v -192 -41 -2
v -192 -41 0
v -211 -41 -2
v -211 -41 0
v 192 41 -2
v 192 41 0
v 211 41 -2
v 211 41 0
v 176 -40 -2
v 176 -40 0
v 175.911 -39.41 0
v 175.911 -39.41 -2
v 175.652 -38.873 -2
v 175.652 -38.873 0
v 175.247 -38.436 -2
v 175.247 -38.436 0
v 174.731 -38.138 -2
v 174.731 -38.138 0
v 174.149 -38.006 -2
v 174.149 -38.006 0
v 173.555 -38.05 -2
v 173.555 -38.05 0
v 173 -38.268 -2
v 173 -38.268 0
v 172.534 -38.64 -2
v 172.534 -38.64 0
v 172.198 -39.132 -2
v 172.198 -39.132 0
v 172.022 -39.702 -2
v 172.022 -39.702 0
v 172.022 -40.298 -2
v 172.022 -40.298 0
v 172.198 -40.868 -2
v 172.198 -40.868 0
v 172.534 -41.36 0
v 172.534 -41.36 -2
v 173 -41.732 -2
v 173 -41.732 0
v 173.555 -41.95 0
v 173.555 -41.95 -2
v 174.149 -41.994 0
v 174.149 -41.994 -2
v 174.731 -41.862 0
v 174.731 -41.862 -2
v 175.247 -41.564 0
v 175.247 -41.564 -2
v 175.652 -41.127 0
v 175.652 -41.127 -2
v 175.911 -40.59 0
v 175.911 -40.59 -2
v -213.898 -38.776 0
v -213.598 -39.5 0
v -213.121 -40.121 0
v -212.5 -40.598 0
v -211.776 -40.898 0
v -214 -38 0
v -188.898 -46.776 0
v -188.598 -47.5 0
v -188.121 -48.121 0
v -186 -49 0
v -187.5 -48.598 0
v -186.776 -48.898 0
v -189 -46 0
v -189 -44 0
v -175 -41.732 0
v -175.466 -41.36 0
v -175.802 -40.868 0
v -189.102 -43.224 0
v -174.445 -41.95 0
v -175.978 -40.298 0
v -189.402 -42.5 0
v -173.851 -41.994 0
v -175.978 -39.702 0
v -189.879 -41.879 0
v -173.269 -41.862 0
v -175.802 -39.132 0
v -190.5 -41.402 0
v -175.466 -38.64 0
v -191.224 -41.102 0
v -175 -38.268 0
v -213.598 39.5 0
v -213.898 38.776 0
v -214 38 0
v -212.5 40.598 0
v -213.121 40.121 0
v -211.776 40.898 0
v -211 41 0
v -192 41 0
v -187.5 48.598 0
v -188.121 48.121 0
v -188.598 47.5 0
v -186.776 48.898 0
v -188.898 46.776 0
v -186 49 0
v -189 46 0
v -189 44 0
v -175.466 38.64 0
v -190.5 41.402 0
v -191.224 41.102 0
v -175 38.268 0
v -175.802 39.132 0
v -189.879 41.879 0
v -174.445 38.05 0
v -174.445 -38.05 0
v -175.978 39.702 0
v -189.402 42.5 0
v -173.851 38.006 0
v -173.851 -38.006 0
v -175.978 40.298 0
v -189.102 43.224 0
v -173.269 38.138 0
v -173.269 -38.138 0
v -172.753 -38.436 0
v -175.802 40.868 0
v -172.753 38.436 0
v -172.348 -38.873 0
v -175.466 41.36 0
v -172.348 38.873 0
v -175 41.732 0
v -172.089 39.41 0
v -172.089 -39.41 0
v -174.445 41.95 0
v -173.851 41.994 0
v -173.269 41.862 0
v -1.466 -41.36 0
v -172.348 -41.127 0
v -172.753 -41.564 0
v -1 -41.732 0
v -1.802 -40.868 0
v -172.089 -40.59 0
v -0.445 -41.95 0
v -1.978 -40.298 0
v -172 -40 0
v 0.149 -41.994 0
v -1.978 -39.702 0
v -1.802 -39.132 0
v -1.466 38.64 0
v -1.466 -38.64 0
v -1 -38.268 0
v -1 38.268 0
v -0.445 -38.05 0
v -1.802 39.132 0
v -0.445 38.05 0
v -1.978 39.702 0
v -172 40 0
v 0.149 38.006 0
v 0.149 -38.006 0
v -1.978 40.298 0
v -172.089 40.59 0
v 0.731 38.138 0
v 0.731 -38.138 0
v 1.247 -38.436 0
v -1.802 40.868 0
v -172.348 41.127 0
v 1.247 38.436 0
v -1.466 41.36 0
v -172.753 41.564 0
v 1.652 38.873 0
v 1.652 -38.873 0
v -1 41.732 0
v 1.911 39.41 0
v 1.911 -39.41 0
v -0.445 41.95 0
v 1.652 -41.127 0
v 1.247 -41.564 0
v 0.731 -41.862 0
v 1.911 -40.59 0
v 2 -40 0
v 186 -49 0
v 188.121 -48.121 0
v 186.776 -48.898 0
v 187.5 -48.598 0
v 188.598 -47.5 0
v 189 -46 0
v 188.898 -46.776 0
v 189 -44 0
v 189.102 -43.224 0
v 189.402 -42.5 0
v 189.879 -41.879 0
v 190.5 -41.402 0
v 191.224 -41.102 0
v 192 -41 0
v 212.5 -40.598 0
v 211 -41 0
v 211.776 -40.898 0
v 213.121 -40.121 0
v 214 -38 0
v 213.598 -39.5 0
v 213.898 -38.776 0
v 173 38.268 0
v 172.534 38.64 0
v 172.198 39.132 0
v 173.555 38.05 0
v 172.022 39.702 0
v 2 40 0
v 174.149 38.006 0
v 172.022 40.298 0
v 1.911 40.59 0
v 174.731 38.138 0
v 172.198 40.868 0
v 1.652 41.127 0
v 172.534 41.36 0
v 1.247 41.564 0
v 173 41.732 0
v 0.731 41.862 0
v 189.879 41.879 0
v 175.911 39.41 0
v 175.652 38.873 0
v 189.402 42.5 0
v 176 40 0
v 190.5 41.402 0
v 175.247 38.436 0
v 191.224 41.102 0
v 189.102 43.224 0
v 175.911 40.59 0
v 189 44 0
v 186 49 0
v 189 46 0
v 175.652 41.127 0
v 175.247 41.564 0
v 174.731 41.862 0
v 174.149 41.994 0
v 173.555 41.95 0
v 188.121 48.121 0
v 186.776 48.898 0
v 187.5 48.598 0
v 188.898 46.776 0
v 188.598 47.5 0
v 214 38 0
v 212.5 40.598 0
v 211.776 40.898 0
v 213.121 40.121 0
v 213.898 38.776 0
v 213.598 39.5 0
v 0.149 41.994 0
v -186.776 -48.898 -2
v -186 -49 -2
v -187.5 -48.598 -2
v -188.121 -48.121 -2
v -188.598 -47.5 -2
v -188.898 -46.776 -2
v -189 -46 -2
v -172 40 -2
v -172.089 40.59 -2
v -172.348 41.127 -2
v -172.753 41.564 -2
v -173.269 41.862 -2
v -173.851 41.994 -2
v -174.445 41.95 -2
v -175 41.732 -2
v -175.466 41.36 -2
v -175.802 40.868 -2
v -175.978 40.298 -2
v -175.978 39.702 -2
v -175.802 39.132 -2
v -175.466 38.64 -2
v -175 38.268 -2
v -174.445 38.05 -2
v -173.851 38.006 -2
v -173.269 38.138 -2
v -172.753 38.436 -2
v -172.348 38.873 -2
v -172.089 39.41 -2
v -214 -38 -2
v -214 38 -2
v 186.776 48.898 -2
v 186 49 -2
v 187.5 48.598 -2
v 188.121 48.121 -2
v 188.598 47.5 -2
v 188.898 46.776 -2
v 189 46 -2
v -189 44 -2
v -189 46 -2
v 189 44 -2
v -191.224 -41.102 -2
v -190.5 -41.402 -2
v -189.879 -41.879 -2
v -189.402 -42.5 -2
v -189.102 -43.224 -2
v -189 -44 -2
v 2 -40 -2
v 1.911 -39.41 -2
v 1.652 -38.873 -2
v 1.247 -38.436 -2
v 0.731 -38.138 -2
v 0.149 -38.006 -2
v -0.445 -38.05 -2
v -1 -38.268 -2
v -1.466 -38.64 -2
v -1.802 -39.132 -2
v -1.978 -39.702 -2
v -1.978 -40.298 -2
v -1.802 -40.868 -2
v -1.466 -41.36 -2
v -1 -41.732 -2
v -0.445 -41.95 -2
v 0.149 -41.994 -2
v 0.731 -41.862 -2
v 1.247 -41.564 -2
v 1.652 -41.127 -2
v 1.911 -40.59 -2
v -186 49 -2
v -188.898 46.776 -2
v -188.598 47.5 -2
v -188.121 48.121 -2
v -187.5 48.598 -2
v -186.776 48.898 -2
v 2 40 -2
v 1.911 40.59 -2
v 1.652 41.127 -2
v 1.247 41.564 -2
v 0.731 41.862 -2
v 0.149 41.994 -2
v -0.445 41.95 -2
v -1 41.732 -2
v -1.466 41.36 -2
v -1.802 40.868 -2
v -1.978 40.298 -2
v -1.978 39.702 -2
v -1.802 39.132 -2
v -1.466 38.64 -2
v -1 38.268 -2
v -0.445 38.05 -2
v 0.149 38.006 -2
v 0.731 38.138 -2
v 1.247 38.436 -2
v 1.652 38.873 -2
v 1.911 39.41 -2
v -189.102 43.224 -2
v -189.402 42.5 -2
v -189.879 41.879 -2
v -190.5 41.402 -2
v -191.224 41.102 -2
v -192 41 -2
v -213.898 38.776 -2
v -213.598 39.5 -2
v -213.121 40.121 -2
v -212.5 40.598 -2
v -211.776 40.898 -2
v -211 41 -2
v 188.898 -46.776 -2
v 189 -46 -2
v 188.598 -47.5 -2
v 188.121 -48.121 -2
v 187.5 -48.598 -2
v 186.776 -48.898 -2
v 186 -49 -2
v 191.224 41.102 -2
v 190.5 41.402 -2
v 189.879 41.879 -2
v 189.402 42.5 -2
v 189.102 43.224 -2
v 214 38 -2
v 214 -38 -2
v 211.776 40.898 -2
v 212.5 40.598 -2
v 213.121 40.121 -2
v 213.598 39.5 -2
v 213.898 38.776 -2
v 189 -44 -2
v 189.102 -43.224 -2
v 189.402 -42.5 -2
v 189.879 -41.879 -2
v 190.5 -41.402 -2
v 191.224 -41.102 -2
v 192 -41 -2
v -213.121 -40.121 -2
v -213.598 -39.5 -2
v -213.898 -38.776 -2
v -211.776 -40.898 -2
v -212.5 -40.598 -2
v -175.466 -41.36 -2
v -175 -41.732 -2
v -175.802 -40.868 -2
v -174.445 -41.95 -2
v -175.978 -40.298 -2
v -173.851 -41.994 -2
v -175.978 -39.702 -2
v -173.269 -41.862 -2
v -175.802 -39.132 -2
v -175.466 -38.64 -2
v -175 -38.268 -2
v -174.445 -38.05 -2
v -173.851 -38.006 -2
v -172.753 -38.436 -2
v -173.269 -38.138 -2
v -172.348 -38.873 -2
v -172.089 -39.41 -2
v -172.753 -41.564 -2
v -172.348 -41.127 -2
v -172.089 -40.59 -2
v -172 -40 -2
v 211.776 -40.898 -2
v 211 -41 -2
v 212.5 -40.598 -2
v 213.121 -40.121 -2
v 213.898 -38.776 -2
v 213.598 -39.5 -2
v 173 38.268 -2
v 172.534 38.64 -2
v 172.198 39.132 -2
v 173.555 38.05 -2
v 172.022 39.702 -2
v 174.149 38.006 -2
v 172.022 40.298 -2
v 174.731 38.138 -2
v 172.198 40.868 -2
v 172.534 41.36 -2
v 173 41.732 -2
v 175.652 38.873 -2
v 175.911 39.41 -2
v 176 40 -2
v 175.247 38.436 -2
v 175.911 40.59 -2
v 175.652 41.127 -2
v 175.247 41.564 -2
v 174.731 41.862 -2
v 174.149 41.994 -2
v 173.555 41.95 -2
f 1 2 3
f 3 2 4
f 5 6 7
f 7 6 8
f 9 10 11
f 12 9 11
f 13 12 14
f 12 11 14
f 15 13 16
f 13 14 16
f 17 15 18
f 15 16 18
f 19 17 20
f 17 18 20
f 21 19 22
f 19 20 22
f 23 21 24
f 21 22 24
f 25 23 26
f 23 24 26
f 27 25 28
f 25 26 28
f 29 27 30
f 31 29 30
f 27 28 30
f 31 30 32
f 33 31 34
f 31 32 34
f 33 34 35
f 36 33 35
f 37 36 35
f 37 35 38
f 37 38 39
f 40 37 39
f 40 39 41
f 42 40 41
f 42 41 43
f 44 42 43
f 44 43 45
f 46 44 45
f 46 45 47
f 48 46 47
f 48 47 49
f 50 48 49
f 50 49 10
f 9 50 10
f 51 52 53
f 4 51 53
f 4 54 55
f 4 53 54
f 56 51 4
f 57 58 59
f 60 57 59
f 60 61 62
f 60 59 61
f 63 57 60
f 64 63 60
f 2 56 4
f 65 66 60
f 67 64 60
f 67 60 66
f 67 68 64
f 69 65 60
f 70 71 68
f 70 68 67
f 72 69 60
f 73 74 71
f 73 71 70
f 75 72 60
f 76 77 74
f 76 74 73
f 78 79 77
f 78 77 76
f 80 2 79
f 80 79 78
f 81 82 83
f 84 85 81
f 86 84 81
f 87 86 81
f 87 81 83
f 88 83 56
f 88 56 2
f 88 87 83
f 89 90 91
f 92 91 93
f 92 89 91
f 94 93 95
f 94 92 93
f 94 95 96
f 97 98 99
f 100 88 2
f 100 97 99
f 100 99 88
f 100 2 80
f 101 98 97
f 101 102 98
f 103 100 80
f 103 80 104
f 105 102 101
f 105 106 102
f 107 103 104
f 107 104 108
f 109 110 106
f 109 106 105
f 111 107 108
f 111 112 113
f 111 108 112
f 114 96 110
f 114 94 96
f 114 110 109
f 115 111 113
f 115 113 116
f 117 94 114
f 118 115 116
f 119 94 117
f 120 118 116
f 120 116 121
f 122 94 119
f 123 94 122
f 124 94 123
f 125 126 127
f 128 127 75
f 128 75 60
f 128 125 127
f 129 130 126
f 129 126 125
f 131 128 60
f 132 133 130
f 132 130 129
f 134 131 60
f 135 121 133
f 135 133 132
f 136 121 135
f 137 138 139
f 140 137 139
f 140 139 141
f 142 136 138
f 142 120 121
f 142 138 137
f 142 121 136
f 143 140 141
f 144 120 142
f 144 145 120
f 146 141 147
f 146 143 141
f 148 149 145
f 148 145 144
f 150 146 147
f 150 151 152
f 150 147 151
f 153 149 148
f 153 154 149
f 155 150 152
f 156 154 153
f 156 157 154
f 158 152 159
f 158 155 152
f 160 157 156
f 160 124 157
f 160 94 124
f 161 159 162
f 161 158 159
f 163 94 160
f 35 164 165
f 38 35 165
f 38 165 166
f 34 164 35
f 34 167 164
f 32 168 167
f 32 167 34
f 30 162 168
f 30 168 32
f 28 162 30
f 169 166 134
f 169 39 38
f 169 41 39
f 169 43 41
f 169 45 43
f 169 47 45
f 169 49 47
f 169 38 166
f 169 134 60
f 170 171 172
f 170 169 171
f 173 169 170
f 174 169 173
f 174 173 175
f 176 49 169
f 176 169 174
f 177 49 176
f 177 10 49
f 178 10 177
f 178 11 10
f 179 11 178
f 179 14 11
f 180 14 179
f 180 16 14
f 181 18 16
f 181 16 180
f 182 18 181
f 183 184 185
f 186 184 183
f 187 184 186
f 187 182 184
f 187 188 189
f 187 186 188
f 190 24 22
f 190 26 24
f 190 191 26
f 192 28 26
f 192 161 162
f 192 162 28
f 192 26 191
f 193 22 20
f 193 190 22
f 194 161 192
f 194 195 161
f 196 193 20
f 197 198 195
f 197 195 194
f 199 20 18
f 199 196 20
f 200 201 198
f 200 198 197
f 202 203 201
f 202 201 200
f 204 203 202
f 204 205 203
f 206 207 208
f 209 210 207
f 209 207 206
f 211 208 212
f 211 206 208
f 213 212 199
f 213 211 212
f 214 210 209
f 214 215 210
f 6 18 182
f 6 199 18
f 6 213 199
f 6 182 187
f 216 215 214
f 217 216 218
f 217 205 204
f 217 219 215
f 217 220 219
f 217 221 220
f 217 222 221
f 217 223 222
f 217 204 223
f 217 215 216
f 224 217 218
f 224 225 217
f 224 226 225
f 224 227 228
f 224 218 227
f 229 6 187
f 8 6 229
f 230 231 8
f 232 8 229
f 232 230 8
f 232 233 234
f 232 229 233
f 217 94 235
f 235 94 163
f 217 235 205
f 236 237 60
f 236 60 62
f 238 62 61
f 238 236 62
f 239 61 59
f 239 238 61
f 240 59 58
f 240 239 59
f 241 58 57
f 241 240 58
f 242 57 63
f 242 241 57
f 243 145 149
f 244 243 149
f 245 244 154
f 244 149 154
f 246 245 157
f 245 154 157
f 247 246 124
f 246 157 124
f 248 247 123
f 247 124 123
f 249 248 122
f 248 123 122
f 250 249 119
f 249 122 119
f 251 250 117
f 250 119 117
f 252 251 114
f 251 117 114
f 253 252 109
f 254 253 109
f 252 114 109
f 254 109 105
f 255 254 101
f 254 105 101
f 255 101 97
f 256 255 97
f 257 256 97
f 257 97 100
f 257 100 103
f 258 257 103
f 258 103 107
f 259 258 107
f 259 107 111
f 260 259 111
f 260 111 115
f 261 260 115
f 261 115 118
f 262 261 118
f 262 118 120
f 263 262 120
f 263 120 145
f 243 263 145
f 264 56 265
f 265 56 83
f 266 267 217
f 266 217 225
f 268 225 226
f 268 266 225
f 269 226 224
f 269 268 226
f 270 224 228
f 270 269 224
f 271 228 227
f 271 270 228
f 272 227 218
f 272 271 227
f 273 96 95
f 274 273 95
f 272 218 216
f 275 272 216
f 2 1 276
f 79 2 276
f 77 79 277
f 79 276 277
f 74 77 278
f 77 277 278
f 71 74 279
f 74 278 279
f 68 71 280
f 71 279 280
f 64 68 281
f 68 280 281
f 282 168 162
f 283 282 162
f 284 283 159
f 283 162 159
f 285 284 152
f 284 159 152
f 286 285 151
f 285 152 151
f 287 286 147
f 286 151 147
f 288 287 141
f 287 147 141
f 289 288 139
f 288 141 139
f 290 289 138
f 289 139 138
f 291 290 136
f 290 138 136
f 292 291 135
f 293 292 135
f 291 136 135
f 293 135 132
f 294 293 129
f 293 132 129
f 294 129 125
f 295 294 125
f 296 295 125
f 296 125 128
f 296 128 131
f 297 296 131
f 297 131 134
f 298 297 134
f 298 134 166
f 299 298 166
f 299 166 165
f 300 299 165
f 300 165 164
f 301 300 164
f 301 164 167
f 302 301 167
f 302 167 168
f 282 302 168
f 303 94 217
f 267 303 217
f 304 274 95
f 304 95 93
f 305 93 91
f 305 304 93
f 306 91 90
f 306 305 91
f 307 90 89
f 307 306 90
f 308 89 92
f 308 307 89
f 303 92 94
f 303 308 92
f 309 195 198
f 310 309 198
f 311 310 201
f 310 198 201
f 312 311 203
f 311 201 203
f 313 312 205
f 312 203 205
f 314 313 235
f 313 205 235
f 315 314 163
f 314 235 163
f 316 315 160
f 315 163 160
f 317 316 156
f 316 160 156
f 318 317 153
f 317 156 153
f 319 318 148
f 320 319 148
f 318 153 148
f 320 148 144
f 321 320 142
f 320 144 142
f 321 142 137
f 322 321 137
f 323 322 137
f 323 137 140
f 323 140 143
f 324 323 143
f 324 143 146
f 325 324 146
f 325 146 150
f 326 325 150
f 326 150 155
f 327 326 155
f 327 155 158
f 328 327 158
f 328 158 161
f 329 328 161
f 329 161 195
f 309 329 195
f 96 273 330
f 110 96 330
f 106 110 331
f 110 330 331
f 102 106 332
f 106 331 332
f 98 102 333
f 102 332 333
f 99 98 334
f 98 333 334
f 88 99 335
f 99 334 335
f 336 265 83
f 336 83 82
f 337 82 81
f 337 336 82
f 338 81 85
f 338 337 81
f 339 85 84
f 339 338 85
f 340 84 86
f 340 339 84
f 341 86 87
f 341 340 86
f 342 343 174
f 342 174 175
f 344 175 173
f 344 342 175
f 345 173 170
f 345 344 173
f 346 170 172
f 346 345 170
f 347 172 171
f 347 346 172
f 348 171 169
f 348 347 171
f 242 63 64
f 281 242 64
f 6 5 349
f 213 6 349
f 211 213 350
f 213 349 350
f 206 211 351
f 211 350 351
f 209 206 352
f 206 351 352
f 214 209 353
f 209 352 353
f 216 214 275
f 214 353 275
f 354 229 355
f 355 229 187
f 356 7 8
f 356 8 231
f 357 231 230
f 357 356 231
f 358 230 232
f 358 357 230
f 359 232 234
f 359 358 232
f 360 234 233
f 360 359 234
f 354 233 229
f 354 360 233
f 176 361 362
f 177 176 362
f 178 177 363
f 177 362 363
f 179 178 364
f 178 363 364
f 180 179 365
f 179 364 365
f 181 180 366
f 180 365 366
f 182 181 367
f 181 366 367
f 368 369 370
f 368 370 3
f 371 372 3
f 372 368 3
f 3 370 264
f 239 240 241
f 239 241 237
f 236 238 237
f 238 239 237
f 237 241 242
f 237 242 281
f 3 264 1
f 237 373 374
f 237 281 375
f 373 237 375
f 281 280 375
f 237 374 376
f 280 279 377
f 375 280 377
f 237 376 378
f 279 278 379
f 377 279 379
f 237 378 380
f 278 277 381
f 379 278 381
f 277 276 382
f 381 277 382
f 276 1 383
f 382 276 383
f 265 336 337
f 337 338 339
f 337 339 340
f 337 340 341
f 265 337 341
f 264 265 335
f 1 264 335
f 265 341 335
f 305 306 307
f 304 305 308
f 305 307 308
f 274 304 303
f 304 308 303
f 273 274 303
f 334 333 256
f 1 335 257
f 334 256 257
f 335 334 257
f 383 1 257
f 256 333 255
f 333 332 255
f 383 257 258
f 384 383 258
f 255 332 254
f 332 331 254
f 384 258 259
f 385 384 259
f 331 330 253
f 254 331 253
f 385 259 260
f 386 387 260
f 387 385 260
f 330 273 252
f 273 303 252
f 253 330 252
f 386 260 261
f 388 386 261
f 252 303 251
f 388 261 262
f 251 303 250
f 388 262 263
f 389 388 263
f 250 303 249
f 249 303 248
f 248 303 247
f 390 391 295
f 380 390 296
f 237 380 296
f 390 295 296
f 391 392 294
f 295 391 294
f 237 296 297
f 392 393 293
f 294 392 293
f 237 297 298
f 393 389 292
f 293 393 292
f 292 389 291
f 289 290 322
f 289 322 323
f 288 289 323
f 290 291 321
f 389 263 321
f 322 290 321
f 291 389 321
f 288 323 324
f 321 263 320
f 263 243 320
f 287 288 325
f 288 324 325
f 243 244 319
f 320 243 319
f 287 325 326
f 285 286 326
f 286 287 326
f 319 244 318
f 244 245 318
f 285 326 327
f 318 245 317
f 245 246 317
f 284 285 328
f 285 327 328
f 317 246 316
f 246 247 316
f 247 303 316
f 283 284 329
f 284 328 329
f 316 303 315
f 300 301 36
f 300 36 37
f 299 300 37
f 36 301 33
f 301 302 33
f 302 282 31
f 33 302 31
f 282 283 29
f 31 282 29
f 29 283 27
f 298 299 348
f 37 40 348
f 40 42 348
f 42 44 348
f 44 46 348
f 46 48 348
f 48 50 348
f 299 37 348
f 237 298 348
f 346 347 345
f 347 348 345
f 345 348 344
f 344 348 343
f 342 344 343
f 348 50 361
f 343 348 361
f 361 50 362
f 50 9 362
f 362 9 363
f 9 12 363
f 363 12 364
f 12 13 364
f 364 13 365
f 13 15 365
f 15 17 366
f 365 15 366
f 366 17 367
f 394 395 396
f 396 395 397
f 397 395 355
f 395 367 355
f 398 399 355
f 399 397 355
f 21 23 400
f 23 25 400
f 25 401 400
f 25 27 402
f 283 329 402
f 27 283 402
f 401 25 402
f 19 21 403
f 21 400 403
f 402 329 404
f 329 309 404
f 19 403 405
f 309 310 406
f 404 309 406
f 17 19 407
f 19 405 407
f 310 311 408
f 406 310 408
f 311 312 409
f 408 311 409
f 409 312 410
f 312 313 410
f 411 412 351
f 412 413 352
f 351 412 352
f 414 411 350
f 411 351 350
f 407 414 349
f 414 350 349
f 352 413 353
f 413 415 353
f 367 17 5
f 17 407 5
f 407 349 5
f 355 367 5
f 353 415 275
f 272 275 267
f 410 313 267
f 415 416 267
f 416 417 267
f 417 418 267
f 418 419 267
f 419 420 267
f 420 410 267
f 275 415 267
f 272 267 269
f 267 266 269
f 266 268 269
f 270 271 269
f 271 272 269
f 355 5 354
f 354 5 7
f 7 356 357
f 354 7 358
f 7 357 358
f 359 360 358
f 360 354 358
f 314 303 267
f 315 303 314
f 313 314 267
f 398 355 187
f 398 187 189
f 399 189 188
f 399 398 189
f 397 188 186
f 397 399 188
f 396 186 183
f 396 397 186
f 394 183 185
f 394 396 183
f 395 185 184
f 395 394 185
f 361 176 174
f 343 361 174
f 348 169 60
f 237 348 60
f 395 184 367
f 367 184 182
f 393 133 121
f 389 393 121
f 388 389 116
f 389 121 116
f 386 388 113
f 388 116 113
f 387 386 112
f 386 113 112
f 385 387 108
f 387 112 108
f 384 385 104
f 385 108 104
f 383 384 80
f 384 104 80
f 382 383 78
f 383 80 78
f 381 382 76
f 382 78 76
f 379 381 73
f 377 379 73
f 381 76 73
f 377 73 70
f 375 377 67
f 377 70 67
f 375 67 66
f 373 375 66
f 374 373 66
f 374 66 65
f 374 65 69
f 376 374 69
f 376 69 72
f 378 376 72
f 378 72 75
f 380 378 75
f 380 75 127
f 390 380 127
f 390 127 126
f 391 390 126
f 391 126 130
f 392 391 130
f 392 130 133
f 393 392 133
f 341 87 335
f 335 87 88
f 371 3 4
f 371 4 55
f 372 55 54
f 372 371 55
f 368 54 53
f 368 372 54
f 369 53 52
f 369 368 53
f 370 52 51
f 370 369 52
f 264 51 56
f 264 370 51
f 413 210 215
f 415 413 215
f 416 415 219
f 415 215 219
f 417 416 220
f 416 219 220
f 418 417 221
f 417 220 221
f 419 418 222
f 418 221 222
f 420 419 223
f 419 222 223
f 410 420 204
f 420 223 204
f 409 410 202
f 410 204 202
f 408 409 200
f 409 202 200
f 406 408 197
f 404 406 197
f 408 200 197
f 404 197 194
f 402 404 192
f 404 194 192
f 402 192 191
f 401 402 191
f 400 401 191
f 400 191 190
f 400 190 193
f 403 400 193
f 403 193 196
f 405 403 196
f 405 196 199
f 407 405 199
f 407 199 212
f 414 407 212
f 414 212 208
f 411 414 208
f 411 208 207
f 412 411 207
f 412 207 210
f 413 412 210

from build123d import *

# Parameters (mm, degrees)
BASE_FLANGE1_DEPTH    = 2
BREAK_CORNER1_START   = -2
BREAK_CORNER1_DEPTH   = 2
BREAK_CORNER1_2_DEPTH = 2
SKETCH2_R             = 2
CUT_EXTRUDE1_DEPTH    = 10
LPATTERN1_COUNT       = 3
LPATTERN1_PITCH       = 174


# Read off the part's stored shape, not the designer's step: Break-Corner1
# Sheet-metal steps are written as plain solids
with BuildPart() as part:
    # Sketch1 → Base-Flange1 (new body)
    with BuildSketch(Plane.XY):
        Polygon((189, -49), (-189, -49), (-189, -41), (-214, -41), (-214, 41), (-189, 41), (-189, 49), (189, 49), (189, 41), (214, 41), (214, -41), (189, -41), align=None)
    extrude(amount=-BASE_FLANGE1_DEPTH)

    # Break-Corner1 outline → Break-Corner1 (cut)
    with BuildSketch(Plane.XY.offset(BREAK_CORNER1_START)):
        with BuildLine():
            Line((214, 41), (211, 41))
            ThreePointArc((211, 41), (213.121320344, 40.121320344), (214, 38))
            Line((214, 38), (214, 41))
        make_face()
        with BuildLine():
            ThreePointArc((186, 49), (188.121320344, 48.121320344), (189, 46))
            Line((189, 46), (189, 49))
            Line((189, 49), (186, 49))
        make_face()
        with BuildLine():
            Line((214, -41), (214, -38))
            ThreePointArc((214, -38), (213.121320344, -40.121320344), (211, -41))
            Line((211, -41), (214, -41))
        make_face()
        with BuildLine():
            ThreePointArc((-189, 46), (-188.121320344, 48.121320344), (-186, 49))
            Line((-186, 49), (-189, 49))
            Line((-189, 49), (-189, 46))
        make_face()
        with BuildLine():
            Line((189, -49), (189, -46))
            ThreePointArc((189, -46), (188.121320344, -48.121320344), (186, -49))
            Line((186, -49), (189, -49))
        make_face()
        with BuildLine():
            ThreePointArc((-214, 38), (-213.121320344, 40.121320344), (-211, 41))
            Line((-211, 41), (-214, 41))
            Line((-214, 41), (-214, 38))
        make_face()
        with BuildLine():
            Line((-189, -49), (-186, -49))
            ThreePointArc((-186, -49), (-188.121320344, -48.121320344), (-189, -46))
            Line((-189, -46), (-189, -49))
        make_face()
        with BuildLine():
            ThreePointArc((-211, -41), (-213.121320344, -40.121320344), (-214, -38))
            Line((-214, -38), (-214, -41))
            Line((-214, -41), (-211, -41))
        make_face()
    extrude(amount=BREAK_CORNER1_DEPTH, mode=Mode.SUBTRACT)

    # Break-Corner1 2 outline → Break-Corner1 2 (add)
    with BuildSketch(Plane.XY.offset(BREAK_CORNER1_START)):
        with BuildLine():
            Line((189, 41), (192, 41))
            ThreePointArc((192, 41), (189.878679656, 41.878679656), (189, 44))
            Line((189, 44), (189, 41))
        make_face()
        with BuildLine():
            ThreePointArc((189, -44), (189.878679656, -41.878679656), (192, -41))
            Line((192, -41), (189, -41))
            Line((189, -41), (189, -44))
        make_face()
        with BuildLine():
            Line((-189, 41), (-189, 44))
            ThreePointArc((-189, 44), (-189.878679656, 41.878679656), (-192, 41))
            Line((-192, 41), (-189, 41))
        make_face()
        with BuildLine():
            ThreePointArc((-192, -41), (-189.878679656, -41.878679656), (-189, -44))
            Line((-189, -44), (-189, -41))
            Line((-189, -41), (-192, -41))
        make_face()
    extrude(amount=BREAK_CORNER1_2_DEPTH)

    # Sketch2 → Cut-Extrude1 (cut)
    with BuildSketch(Plane.XY):
        with Locations((-174, 40)):
            Circle(SKETCH2_R)
        with Locations((-174, -40)):
            Circle(SKETCH2_R)
    cut_extrude1 = extrude(amount=-CUT_EXTRUDE1_DEPTH, mode=Mode.SUBTRACT)

    # LPattern1: Cut-Extrude1 ×3
    with Locations(*[(i * LPATTERN1_PITCH, 0, 0) for i in range(1, LPATTERN1_COUNT)]):
        add(cut_extrude1, mode=Mode.SUBTRACT)


solid = part.part
